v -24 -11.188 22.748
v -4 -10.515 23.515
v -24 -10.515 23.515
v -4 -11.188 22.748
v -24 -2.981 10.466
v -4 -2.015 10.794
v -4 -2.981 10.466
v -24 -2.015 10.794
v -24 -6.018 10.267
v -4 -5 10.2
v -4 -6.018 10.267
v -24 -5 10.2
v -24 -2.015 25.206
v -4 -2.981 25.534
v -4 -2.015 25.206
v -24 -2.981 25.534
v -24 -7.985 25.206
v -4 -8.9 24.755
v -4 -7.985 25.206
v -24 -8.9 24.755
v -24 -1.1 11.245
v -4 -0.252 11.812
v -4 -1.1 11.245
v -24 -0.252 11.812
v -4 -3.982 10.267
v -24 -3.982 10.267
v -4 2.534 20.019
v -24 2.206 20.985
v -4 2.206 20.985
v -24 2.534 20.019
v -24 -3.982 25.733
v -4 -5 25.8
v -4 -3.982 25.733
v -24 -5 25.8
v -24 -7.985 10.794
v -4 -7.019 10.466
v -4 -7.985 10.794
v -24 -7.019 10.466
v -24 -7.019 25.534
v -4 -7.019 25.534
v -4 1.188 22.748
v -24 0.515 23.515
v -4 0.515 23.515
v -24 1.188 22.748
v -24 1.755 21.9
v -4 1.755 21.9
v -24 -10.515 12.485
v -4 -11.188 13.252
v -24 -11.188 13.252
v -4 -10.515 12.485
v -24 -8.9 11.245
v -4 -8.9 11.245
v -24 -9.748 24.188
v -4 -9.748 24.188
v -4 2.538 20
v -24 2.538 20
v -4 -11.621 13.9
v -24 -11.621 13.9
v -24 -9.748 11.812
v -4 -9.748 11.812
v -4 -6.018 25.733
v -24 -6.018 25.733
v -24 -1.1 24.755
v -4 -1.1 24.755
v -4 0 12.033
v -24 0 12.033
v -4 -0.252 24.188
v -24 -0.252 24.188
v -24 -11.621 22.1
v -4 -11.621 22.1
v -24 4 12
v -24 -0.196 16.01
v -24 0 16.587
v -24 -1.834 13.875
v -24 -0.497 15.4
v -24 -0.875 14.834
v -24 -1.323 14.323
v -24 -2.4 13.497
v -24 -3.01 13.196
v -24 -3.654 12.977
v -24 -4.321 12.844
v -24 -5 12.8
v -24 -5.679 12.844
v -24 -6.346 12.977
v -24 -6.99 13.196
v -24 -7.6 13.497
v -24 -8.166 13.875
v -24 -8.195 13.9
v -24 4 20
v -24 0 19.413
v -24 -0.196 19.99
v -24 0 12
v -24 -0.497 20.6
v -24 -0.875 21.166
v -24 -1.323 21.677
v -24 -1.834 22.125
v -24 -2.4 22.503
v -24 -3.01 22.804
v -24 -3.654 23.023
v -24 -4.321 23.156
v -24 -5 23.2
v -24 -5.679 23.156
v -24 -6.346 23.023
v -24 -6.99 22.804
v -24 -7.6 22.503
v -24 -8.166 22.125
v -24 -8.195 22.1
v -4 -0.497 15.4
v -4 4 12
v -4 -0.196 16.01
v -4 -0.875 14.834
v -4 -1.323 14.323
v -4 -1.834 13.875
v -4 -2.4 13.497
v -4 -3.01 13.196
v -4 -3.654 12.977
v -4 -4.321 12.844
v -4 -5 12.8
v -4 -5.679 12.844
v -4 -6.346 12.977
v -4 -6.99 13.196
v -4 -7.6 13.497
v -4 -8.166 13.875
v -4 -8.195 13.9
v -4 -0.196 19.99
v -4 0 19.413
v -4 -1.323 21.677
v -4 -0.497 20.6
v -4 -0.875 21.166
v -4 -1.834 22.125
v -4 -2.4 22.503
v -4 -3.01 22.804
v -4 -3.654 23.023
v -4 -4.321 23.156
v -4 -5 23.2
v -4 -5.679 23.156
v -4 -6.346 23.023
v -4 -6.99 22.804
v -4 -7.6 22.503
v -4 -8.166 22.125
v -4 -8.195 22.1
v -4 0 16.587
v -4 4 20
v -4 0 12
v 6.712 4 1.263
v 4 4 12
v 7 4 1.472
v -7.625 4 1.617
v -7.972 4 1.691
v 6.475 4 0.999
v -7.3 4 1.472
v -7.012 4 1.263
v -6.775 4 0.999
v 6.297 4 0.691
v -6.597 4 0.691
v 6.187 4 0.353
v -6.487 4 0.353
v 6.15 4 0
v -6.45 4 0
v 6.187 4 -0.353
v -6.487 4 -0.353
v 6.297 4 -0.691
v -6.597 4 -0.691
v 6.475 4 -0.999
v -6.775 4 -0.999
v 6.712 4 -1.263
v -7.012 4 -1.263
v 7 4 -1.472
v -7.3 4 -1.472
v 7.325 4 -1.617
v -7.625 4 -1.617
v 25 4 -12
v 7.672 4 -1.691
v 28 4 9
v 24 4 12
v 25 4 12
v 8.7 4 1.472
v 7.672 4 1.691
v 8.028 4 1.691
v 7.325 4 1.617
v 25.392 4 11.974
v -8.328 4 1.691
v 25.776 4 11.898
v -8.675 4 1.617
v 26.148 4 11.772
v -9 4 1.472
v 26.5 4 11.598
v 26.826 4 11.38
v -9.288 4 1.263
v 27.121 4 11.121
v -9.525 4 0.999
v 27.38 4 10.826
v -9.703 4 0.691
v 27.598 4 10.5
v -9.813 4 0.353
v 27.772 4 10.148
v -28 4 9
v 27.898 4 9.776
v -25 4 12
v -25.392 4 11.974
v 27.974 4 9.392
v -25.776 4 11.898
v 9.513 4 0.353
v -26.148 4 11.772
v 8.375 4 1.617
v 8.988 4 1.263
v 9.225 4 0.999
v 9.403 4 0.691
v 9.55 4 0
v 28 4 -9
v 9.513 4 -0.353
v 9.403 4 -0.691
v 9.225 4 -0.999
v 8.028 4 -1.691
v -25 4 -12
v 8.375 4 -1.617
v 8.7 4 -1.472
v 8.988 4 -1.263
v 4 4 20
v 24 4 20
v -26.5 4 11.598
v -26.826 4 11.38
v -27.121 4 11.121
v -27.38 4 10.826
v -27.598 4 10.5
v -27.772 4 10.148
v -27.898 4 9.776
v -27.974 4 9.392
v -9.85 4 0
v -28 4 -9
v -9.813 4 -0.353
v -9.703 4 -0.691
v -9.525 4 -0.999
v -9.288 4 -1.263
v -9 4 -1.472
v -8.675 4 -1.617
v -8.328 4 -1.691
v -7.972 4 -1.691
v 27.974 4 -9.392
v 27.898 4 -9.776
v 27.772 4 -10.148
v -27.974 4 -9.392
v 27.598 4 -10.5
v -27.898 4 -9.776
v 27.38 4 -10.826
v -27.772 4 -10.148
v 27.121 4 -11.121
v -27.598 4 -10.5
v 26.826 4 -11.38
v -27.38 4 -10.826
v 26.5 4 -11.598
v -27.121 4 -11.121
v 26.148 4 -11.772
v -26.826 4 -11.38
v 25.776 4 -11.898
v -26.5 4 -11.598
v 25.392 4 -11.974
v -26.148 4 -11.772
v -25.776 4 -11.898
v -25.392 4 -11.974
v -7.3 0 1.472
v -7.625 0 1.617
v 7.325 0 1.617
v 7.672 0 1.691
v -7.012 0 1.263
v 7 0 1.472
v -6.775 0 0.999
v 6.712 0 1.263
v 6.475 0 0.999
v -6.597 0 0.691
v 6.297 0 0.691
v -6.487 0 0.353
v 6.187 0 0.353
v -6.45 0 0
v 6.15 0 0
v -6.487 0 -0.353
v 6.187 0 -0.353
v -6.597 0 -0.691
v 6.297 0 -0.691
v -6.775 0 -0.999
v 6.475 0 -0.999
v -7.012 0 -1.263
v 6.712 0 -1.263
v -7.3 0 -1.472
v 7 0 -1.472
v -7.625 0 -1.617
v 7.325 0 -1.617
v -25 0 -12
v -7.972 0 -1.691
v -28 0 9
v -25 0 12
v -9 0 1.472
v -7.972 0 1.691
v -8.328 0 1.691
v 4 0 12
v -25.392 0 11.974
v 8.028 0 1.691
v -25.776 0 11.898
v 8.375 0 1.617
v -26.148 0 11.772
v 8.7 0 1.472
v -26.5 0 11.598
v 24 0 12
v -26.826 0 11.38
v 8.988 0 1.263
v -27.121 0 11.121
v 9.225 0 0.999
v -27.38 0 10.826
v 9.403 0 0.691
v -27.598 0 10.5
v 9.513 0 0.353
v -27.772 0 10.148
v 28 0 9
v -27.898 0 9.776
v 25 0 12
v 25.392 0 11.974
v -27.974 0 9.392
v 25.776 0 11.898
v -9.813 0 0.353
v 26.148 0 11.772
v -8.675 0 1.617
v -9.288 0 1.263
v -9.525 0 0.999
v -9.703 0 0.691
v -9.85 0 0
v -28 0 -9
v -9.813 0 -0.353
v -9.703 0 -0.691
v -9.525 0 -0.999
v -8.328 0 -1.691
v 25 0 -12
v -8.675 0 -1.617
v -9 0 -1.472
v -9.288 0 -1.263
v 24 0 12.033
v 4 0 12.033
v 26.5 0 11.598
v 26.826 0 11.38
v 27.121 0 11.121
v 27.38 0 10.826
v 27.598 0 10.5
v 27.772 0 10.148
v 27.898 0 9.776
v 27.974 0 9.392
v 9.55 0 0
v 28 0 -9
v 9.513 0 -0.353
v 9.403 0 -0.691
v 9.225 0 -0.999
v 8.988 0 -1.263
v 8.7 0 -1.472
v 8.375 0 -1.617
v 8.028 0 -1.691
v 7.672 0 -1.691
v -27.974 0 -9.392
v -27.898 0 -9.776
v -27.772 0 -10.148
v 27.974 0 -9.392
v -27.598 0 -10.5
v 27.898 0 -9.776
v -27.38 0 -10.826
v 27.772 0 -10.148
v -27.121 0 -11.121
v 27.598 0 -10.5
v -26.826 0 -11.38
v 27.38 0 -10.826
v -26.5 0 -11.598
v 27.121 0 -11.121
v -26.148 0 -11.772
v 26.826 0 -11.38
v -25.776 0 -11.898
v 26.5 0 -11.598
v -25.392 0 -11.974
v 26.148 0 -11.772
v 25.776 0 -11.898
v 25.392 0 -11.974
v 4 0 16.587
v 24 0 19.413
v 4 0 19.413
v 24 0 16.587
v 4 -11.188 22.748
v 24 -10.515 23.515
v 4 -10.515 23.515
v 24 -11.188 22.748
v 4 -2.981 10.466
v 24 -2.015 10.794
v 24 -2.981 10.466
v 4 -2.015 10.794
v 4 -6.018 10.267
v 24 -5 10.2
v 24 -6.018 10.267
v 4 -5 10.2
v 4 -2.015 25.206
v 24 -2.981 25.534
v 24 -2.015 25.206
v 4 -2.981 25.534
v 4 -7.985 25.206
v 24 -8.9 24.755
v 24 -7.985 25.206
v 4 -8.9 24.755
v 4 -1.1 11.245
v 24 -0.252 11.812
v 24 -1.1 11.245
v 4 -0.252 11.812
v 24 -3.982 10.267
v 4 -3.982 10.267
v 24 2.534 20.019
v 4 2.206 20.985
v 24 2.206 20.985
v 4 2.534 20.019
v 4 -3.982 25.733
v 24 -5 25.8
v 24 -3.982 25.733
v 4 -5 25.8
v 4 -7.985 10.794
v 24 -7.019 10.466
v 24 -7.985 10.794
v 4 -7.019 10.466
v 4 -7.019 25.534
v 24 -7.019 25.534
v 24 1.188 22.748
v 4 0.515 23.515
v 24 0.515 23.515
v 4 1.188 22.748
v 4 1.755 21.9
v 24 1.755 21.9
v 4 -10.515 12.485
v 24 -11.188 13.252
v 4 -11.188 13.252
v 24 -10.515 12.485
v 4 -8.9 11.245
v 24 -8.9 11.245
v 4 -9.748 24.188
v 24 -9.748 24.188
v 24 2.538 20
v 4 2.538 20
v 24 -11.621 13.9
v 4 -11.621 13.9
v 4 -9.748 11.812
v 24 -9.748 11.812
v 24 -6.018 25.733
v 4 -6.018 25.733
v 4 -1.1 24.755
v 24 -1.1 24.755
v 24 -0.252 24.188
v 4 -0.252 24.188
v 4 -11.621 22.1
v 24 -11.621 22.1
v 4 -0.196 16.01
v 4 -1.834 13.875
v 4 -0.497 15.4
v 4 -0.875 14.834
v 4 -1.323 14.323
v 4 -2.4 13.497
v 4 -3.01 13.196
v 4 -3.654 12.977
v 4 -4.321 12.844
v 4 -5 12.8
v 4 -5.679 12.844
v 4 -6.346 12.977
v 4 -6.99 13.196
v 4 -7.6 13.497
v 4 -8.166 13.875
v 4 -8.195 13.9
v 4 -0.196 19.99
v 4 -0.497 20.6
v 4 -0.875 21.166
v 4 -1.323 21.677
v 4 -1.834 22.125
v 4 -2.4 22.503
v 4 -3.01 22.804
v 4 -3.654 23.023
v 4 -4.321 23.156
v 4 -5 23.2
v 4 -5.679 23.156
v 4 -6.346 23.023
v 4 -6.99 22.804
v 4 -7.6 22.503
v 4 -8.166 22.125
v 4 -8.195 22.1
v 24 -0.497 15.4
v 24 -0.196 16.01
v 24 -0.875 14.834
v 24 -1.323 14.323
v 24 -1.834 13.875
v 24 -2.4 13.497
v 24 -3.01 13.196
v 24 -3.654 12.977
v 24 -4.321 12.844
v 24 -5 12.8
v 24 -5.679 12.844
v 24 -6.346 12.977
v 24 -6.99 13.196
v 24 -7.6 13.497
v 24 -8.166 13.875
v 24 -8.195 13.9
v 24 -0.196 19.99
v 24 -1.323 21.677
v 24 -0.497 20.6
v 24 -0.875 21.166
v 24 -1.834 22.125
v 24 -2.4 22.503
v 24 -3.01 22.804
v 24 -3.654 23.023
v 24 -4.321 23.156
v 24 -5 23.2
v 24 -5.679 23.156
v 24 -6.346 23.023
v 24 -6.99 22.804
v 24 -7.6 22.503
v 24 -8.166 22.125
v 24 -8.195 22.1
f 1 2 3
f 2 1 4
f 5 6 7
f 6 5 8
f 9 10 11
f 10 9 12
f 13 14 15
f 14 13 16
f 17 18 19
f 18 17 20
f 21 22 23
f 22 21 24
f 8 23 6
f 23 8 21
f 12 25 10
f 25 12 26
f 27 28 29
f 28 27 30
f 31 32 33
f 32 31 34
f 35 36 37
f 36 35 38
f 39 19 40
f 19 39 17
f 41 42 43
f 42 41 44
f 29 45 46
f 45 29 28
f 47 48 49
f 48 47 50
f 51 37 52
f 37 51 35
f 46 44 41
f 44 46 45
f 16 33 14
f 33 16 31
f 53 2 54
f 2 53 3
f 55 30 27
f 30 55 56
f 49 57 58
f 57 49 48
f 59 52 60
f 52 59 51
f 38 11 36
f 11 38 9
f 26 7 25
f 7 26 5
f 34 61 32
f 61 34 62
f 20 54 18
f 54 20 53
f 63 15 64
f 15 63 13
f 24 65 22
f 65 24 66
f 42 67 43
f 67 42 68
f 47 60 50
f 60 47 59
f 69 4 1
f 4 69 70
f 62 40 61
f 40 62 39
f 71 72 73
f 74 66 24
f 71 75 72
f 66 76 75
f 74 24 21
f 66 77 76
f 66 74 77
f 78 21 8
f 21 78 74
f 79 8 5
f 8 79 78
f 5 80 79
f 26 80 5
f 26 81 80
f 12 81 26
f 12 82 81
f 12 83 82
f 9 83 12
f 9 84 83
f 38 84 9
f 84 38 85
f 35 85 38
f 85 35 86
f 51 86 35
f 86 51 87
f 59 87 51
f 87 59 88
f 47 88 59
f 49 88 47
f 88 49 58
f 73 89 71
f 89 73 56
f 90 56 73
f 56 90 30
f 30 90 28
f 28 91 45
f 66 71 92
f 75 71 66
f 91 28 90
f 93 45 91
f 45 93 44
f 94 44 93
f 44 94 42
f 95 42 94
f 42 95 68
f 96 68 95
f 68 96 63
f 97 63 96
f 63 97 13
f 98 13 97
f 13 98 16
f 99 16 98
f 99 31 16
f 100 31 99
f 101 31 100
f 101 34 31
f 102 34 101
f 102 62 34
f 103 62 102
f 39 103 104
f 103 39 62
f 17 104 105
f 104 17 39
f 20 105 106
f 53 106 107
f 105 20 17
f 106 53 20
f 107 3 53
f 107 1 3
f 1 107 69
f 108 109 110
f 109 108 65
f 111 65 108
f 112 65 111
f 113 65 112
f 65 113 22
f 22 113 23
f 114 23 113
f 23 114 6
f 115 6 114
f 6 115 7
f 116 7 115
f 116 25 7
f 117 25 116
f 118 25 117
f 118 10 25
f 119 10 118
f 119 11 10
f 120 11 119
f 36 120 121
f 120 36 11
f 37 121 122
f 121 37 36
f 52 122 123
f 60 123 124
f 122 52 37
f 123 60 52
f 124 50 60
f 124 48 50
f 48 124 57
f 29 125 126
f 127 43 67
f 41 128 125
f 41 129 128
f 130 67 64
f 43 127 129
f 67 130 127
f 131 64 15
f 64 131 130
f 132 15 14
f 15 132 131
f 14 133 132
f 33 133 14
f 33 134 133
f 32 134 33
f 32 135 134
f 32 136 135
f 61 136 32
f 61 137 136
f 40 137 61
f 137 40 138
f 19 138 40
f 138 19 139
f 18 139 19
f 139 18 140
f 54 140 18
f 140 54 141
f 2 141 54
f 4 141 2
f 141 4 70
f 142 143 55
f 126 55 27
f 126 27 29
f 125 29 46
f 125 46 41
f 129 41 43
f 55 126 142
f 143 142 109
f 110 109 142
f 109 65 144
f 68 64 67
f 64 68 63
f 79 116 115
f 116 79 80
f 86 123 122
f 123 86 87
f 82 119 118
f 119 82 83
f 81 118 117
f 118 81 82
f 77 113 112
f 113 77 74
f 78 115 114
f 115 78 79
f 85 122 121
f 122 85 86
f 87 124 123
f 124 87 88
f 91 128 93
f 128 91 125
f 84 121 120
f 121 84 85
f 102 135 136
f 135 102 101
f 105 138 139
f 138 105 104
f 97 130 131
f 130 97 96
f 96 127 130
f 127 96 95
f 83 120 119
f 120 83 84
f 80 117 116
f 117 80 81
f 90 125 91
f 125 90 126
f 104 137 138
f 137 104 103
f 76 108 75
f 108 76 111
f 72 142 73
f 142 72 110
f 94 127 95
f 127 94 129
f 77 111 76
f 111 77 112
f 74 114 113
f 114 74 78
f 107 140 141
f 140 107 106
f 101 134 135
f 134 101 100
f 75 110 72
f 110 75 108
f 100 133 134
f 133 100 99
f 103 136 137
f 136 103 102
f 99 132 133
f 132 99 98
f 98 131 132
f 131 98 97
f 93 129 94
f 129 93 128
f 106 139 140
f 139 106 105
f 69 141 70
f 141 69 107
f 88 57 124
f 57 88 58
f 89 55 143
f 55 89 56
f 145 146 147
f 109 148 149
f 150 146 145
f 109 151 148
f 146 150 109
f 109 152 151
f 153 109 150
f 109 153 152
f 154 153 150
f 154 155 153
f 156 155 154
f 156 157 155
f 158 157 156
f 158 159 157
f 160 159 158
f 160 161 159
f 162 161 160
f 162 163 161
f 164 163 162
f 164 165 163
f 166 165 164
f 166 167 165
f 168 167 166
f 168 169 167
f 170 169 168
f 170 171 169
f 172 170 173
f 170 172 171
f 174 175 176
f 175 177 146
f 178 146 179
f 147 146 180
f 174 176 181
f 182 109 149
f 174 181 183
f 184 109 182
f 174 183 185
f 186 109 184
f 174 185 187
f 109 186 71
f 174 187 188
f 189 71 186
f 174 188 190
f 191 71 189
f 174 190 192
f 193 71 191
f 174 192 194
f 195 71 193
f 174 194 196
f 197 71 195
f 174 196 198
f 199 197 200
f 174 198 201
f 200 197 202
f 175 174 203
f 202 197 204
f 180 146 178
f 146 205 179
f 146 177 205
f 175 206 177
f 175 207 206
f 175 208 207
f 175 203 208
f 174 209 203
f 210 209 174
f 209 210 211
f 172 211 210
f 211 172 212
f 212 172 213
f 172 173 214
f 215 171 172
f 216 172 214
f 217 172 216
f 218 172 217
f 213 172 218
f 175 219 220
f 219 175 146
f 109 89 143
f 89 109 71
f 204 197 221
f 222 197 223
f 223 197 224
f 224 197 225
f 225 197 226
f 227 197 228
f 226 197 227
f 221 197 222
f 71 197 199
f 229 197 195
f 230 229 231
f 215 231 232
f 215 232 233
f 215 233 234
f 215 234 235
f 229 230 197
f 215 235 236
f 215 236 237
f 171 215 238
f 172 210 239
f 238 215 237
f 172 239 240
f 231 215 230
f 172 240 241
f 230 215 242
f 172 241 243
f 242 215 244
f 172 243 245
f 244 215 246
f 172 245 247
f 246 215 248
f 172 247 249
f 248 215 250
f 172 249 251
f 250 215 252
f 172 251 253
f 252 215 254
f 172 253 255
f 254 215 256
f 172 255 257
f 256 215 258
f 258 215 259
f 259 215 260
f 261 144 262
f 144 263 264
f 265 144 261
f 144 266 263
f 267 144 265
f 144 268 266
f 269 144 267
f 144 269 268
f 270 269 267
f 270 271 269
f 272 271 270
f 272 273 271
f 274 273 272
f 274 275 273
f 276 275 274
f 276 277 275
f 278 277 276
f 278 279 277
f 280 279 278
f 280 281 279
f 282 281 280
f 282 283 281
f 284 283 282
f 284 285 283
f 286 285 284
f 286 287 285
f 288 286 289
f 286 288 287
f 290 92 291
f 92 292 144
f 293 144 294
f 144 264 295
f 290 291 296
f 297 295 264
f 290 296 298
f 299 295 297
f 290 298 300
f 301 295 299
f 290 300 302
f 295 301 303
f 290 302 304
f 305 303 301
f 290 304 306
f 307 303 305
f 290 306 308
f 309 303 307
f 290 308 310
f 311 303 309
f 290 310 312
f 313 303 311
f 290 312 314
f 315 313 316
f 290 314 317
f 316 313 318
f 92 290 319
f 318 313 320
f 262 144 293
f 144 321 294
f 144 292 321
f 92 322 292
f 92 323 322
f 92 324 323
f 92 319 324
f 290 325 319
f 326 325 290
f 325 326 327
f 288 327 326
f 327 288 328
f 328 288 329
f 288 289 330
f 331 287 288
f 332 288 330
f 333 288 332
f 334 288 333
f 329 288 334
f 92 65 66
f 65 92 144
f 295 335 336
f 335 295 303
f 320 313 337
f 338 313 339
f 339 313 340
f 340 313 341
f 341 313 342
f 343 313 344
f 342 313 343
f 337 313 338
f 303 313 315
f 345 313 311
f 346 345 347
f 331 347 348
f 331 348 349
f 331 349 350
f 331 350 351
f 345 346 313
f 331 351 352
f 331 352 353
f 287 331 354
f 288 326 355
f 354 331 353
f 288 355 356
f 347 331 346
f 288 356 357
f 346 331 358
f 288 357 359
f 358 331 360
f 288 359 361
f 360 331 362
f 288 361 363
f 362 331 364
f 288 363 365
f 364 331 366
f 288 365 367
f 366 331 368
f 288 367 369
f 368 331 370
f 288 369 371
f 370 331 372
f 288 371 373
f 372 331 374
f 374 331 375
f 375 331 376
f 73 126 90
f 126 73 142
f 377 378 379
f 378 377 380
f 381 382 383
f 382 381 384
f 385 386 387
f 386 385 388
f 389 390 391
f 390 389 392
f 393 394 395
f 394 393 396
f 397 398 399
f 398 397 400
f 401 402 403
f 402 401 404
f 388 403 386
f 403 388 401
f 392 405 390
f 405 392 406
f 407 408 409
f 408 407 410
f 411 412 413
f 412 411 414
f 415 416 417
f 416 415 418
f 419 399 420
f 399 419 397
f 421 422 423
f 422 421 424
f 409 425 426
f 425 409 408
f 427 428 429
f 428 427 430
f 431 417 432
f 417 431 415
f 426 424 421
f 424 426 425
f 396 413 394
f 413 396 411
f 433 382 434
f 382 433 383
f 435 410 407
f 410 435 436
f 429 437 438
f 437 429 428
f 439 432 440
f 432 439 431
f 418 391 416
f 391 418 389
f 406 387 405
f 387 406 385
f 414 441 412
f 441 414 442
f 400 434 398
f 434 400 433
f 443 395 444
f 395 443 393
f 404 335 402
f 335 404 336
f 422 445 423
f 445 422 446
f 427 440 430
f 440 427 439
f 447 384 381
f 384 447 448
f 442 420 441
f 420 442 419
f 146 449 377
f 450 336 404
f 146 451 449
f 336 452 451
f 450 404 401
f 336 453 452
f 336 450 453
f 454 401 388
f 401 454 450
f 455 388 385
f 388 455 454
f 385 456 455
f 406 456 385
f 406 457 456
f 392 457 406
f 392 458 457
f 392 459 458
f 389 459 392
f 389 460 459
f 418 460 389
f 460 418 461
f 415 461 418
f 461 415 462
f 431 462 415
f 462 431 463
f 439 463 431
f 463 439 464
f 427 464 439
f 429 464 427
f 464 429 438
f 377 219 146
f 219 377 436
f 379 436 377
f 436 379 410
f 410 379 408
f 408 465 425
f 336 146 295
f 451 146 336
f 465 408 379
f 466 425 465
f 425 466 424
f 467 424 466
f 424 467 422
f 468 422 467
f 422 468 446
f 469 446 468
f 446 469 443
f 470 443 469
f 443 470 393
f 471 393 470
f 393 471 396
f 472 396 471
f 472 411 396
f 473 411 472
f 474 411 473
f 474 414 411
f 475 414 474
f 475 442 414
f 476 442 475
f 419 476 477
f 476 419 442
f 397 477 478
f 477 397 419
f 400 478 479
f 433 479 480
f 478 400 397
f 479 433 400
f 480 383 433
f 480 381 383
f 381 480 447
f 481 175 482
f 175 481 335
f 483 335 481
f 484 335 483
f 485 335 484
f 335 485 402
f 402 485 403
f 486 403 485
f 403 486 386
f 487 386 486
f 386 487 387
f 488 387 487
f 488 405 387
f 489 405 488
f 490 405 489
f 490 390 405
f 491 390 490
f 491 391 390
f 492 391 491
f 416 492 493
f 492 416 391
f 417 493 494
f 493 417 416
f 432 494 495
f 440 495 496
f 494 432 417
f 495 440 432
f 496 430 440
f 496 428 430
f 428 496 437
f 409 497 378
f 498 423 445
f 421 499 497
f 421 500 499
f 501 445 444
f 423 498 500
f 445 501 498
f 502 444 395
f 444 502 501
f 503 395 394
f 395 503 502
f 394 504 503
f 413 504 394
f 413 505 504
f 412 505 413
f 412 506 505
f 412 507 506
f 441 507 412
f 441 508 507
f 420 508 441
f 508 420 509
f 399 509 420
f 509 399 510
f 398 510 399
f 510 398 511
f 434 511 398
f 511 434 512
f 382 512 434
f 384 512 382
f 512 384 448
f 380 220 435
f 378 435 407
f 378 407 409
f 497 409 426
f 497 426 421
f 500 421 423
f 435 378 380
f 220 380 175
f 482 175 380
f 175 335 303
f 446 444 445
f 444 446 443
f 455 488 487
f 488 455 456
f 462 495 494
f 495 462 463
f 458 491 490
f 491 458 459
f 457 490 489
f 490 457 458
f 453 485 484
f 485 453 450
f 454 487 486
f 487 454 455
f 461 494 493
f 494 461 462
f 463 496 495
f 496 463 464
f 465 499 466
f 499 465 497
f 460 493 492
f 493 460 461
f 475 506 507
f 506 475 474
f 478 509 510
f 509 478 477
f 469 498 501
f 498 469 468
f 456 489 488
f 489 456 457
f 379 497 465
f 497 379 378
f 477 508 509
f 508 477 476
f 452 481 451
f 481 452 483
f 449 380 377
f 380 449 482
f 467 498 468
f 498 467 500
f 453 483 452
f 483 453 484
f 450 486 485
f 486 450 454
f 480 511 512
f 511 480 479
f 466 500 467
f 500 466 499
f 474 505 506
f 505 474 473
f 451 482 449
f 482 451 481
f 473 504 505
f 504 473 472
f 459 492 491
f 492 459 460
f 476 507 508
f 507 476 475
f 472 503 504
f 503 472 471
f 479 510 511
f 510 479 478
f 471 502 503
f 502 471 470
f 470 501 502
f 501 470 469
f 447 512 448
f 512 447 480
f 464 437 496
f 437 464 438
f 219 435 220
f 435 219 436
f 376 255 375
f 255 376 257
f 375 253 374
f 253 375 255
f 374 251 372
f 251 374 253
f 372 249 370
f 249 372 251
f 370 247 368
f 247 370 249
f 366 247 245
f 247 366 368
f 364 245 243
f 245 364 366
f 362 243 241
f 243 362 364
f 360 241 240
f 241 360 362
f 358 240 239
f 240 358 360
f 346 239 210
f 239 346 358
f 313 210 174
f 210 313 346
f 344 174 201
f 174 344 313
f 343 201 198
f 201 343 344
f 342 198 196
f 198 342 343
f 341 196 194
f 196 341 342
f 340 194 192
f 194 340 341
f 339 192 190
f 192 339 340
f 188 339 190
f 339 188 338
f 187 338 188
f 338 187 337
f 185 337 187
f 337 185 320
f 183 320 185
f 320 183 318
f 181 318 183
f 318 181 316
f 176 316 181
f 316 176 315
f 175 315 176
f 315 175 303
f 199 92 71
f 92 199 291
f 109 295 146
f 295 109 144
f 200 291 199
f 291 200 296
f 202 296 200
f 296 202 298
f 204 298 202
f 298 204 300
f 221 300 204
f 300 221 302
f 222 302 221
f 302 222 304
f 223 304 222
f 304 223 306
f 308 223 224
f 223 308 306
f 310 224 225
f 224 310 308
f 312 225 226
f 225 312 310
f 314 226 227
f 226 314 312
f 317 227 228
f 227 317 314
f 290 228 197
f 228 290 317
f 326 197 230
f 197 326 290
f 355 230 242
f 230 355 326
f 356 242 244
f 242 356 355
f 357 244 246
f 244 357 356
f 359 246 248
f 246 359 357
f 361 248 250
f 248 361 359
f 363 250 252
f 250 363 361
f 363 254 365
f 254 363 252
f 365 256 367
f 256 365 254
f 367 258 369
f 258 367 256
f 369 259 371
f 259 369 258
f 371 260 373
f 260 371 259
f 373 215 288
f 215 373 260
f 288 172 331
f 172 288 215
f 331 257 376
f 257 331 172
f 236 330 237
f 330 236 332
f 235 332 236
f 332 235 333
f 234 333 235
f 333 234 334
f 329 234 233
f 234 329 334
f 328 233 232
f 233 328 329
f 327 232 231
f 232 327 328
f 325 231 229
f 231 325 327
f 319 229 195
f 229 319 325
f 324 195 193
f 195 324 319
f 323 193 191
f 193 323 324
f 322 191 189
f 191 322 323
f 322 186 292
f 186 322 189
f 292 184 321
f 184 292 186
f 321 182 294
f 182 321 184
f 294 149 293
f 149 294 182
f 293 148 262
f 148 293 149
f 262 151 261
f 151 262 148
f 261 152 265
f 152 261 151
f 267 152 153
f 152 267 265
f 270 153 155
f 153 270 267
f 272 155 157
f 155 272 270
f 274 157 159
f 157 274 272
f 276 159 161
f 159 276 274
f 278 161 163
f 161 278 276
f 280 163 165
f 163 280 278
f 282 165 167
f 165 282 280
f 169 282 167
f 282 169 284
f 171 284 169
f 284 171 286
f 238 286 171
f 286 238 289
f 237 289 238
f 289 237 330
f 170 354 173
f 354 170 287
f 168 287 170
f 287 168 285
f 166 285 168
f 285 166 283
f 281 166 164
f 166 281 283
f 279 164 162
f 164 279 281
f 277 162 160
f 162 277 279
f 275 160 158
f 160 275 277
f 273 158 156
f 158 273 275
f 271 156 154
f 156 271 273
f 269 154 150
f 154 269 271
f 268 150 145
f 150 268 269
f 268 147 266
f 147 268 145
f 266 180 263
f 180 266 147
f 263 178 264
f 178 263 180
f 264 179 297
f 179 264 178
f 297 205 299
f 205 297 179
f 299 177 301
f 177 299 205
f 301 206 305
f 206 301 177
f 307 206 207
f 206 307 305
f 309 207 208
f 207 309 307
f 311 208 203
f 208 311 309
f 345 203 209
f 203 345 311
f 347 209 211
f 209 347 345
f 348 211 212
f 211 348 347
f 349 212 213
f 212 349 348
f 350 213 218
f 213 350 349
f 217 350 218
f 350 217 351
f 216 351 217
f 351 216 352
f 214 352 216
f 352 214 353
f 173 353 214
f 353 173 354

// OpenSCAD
// file: tube_clip.scad
// HUB75 display frame - V1.2 V1.1-style tube clip
//
// Self-contained component.
// No project_config.scad dependency.
//
// Coordinate system:
// X = tube direction
// Y = front/rear
// Z = vertical
//
// The C-opening points away from the plate in -Y.

 /* [Clip] */
clip_length = 20.0;
clip_wall = 2.6;
clip_inner_diameter = 10.4;
clip_opening = 8.2;

 /* [Attachment] */
clip_plate_overlap = 1.4;
clip_vertical_overlap = 2.0;
attachment_thickness = 4.0;
attachment_plate_height = 24.0;

 /* [Standalone preview] */
preview_edge = "top"; // [top, bottom]
preview_center_x = 0.0;
preview_tube_z = 18.0;
preview_tube_y = -5.0;
preview_color = [0.86, 0.08, 0.05, 1];

 /* [Resolution] */
$fn = 48;


function clip_outer_diameter(
    inner_diameter,
    wall
) =
    inner_diameter + 2 * wall;


function clip_outer_radius(
    inner_diameter,
    wall
) =
    clip_outer_diameter(
        inner_diameter,
        wall
    ) / 2;


module tube_snap_clip(
    center_x = 0,
    local_tube_y = -5,
    local_tube_z = 18,
    length = clip_length,
    wall = clip_wall,
    inner_diameter = clip_inner_diameter,
    opening = clip_opening,
    part_color = preview_color
) {
    outer_d =
        clip_outer_diameter(
            inner_diameter,
            wall
        );

    outer_r =
        outer_d / 2;

    color(part_color)
        difference() {
            translate([
                center_x,
                local_tube_y,
                local_tube_z
            ])
                rotate([0, 90, 0])
                    cylinder(
                        h=length,
                        d=outer_d,
                        center=true,
                        $fn=48
                    );

            translate([
                center_x,
                local_tube_y,
                local_tube_z
            ])
                rotate([0, 90, 0])
                    cylinder(
                        h=length + 0.4,
                        d=inner_diameter,
                        center=true,
                        $fn=48
                    );

            // V1.1 orientation: opening away from the plate (-Y).
            translate([
                center_x - length/2 - 0.3,
                local_tube_y - outer_r - 0.6,
                local_tube_z - opening/2
            ])
                cube([
                    length + 0.6,
                    outer_r + 0.6,
                    opening
                ]);
        }
}


module tube_clip_extension(
    center_x = 0,
    edge = "top",
    local_tube_z = 18,
    length = clip_length,
    thickness = attachment_thickness,
    plate_height = attachment_plate_height,
    vertical_overlap = clip_vertical_overlap,
    part_color = preview_color
) {
    color(part_color)
        if(edge == "top")
            translate([
                center_x - length/2,
                0,
                plate_height/2 - thickness
            ])
                cube([
                    length,
                    thickness,
                    (local_tube_z + vertical_overlap)
                        - (plate_height/2 - thickness)
                ]);
        else
            translate([
                center_x - length/2,
                0,
                local_tube_z - vertical_overlap
            ])
                cube([
                    length,
                    thickness,
                    (-plate_height/2 + thickness)
                        - (local_tube_z - vertical_overlap)
                ]);
}


module tube_clip_with_extension(
    center_x = 0,
    edge = "top",
    local_tube_y = -5,
    local_tube_z = 18,
    length = clip_length,
    wall = clip_wall,
    inner_diameter = clip_inner_diameter,
    opening = clip_opening,
    thickness = attachment_thickness,
    plate_height = attachment_plate_height,
    vertical_overlap = clip_vertical_overlap,
    part_color = preview_color
) {
    union() {
        tube_snap_clip(
            center_x=center_x,
            local_tube_y=local_tube_y,
            local_tube_z=local_tube_z,
            length=length,
            wall=wall,
            inner_diameter=inner_diameter,
            opening=opening,
            part_color=part_color
        );

        tube_clip_extension(
            center_x=center_x,
            edge=edge,
            local_tube_z=local_tube_z,
            length=length,
            thickness=thickness,
            plate_height=plate_height,
            vertical_overlap=vertical_overlap,
            part_color=part_color
        );
    }
}


// Standalone preview
tube_clip_with_extension(
    center_x=preview_center_x,
    edge=preview_edge,
    local_tube_y=preview_tube_y,
    local_tube_z=preview_tube_z
);
// main file
// HUB75 display frame - V1.2 compact two-clip seam coupler
//
// Self-contained component.
// No project_config.scad dependency.

use <tube_clip.scad>

/* [Plate] */
plate_width = 56.0;
plate_height = 24.0;
plate_thickness = 4.0;
corner_radius = 3.0;

/* [Mounting holes] */
left_hole_x = -8.15;
right_hole_x = 7.85;
hole_diameter = 3.4;

/* [Clip positions] */
left_clip_x = -14.0;
right_clip_x = 14.0;

/* [Tube clip] */
clip_length = 20.0;
clip_wall = 2.6;
clip_inner_diameter = 10.4;
clip_opening = 8.2;
clip_vertical_overlap = 2.0;

/* [Standalone preview] */
preview_direction = "top"; // [top, bottom]
preview_tube_y = -5.0;
preview_tube_z = 18.0;
preview_color = [0.86, 0.08, 0.05, 1];

/* [Resolution] */
$fn = 48;


module rounded_rectangle_2d(width, height, radius) {
    offset(r=radius)
        square(
            [width - 2*radius, height - 2*radius],
            center=true
        );
}


module tube_seam_coupler(
    direction = "top",
    width = plate_width,
    height = plate_height,
    thickness = plate_thickness,
    radius = corner_radius,
    left_hole_x_value = left_hole_x,
    right_hole_x_value = right_hole_x,
    hole_diameter_value = hole_diameter,
    left_clip_x_value = left_clip_x,
    right_clip_x_value = right_clip_x,
    local_tube_y = preview_tube_y,
    local_tube_z = preview_tube_z,
    clip_length_value = clip_length,
    clip_wall_value = clip_wall,
    clip_inner_diameter_value = clip_inner_diameter,
    clip_opening_value = clip_opening,
    clip_vertical_overlap_value = clip_vertical_overlap,
    part_color = preview_color
) {
    color(part_color)
        translate([0, thickness, 0])
            rotate([90, 0, 0])
                linear_extrude(height=thickness)
                    difference() {
                        rounded_rectangle_2d(
                            width,
                            height,
                            radius
                        );

                        translate([
                            left_hole_x_value,
                            0
                        ])
                            circle(
                                d=hole_diameter_value,
                                $fn=30
                            );

                        translate([
                            right_hole_x_value,
                            0
                        ])
                            circle(
                                d=hole_diameter_value,
                                $fn=30
                            );
                    }

    for(clip_x=[
        left_clip_x_value,
        right_clip_x_value
    ])
        tube_clip_with_extension(
            center_x=clip_x,
            edge=direction,
            local_tube_y=local_tube_y,
            local_tube_z=local_tube_z,
            length=clip_length_value,
            wall=clip_wall_value,
            inner_diameter=
                clip_inner_diameter_value,
            opening=clip_opening_value,
            thickness=thickness,
            plate_height=height,
            vertical_overlap=
                clip_vertical_overlap_value,
            part_color=part_color
        );
}


// Standalone preview
tube_seam_coupler(
    direction=preview_direction
);
